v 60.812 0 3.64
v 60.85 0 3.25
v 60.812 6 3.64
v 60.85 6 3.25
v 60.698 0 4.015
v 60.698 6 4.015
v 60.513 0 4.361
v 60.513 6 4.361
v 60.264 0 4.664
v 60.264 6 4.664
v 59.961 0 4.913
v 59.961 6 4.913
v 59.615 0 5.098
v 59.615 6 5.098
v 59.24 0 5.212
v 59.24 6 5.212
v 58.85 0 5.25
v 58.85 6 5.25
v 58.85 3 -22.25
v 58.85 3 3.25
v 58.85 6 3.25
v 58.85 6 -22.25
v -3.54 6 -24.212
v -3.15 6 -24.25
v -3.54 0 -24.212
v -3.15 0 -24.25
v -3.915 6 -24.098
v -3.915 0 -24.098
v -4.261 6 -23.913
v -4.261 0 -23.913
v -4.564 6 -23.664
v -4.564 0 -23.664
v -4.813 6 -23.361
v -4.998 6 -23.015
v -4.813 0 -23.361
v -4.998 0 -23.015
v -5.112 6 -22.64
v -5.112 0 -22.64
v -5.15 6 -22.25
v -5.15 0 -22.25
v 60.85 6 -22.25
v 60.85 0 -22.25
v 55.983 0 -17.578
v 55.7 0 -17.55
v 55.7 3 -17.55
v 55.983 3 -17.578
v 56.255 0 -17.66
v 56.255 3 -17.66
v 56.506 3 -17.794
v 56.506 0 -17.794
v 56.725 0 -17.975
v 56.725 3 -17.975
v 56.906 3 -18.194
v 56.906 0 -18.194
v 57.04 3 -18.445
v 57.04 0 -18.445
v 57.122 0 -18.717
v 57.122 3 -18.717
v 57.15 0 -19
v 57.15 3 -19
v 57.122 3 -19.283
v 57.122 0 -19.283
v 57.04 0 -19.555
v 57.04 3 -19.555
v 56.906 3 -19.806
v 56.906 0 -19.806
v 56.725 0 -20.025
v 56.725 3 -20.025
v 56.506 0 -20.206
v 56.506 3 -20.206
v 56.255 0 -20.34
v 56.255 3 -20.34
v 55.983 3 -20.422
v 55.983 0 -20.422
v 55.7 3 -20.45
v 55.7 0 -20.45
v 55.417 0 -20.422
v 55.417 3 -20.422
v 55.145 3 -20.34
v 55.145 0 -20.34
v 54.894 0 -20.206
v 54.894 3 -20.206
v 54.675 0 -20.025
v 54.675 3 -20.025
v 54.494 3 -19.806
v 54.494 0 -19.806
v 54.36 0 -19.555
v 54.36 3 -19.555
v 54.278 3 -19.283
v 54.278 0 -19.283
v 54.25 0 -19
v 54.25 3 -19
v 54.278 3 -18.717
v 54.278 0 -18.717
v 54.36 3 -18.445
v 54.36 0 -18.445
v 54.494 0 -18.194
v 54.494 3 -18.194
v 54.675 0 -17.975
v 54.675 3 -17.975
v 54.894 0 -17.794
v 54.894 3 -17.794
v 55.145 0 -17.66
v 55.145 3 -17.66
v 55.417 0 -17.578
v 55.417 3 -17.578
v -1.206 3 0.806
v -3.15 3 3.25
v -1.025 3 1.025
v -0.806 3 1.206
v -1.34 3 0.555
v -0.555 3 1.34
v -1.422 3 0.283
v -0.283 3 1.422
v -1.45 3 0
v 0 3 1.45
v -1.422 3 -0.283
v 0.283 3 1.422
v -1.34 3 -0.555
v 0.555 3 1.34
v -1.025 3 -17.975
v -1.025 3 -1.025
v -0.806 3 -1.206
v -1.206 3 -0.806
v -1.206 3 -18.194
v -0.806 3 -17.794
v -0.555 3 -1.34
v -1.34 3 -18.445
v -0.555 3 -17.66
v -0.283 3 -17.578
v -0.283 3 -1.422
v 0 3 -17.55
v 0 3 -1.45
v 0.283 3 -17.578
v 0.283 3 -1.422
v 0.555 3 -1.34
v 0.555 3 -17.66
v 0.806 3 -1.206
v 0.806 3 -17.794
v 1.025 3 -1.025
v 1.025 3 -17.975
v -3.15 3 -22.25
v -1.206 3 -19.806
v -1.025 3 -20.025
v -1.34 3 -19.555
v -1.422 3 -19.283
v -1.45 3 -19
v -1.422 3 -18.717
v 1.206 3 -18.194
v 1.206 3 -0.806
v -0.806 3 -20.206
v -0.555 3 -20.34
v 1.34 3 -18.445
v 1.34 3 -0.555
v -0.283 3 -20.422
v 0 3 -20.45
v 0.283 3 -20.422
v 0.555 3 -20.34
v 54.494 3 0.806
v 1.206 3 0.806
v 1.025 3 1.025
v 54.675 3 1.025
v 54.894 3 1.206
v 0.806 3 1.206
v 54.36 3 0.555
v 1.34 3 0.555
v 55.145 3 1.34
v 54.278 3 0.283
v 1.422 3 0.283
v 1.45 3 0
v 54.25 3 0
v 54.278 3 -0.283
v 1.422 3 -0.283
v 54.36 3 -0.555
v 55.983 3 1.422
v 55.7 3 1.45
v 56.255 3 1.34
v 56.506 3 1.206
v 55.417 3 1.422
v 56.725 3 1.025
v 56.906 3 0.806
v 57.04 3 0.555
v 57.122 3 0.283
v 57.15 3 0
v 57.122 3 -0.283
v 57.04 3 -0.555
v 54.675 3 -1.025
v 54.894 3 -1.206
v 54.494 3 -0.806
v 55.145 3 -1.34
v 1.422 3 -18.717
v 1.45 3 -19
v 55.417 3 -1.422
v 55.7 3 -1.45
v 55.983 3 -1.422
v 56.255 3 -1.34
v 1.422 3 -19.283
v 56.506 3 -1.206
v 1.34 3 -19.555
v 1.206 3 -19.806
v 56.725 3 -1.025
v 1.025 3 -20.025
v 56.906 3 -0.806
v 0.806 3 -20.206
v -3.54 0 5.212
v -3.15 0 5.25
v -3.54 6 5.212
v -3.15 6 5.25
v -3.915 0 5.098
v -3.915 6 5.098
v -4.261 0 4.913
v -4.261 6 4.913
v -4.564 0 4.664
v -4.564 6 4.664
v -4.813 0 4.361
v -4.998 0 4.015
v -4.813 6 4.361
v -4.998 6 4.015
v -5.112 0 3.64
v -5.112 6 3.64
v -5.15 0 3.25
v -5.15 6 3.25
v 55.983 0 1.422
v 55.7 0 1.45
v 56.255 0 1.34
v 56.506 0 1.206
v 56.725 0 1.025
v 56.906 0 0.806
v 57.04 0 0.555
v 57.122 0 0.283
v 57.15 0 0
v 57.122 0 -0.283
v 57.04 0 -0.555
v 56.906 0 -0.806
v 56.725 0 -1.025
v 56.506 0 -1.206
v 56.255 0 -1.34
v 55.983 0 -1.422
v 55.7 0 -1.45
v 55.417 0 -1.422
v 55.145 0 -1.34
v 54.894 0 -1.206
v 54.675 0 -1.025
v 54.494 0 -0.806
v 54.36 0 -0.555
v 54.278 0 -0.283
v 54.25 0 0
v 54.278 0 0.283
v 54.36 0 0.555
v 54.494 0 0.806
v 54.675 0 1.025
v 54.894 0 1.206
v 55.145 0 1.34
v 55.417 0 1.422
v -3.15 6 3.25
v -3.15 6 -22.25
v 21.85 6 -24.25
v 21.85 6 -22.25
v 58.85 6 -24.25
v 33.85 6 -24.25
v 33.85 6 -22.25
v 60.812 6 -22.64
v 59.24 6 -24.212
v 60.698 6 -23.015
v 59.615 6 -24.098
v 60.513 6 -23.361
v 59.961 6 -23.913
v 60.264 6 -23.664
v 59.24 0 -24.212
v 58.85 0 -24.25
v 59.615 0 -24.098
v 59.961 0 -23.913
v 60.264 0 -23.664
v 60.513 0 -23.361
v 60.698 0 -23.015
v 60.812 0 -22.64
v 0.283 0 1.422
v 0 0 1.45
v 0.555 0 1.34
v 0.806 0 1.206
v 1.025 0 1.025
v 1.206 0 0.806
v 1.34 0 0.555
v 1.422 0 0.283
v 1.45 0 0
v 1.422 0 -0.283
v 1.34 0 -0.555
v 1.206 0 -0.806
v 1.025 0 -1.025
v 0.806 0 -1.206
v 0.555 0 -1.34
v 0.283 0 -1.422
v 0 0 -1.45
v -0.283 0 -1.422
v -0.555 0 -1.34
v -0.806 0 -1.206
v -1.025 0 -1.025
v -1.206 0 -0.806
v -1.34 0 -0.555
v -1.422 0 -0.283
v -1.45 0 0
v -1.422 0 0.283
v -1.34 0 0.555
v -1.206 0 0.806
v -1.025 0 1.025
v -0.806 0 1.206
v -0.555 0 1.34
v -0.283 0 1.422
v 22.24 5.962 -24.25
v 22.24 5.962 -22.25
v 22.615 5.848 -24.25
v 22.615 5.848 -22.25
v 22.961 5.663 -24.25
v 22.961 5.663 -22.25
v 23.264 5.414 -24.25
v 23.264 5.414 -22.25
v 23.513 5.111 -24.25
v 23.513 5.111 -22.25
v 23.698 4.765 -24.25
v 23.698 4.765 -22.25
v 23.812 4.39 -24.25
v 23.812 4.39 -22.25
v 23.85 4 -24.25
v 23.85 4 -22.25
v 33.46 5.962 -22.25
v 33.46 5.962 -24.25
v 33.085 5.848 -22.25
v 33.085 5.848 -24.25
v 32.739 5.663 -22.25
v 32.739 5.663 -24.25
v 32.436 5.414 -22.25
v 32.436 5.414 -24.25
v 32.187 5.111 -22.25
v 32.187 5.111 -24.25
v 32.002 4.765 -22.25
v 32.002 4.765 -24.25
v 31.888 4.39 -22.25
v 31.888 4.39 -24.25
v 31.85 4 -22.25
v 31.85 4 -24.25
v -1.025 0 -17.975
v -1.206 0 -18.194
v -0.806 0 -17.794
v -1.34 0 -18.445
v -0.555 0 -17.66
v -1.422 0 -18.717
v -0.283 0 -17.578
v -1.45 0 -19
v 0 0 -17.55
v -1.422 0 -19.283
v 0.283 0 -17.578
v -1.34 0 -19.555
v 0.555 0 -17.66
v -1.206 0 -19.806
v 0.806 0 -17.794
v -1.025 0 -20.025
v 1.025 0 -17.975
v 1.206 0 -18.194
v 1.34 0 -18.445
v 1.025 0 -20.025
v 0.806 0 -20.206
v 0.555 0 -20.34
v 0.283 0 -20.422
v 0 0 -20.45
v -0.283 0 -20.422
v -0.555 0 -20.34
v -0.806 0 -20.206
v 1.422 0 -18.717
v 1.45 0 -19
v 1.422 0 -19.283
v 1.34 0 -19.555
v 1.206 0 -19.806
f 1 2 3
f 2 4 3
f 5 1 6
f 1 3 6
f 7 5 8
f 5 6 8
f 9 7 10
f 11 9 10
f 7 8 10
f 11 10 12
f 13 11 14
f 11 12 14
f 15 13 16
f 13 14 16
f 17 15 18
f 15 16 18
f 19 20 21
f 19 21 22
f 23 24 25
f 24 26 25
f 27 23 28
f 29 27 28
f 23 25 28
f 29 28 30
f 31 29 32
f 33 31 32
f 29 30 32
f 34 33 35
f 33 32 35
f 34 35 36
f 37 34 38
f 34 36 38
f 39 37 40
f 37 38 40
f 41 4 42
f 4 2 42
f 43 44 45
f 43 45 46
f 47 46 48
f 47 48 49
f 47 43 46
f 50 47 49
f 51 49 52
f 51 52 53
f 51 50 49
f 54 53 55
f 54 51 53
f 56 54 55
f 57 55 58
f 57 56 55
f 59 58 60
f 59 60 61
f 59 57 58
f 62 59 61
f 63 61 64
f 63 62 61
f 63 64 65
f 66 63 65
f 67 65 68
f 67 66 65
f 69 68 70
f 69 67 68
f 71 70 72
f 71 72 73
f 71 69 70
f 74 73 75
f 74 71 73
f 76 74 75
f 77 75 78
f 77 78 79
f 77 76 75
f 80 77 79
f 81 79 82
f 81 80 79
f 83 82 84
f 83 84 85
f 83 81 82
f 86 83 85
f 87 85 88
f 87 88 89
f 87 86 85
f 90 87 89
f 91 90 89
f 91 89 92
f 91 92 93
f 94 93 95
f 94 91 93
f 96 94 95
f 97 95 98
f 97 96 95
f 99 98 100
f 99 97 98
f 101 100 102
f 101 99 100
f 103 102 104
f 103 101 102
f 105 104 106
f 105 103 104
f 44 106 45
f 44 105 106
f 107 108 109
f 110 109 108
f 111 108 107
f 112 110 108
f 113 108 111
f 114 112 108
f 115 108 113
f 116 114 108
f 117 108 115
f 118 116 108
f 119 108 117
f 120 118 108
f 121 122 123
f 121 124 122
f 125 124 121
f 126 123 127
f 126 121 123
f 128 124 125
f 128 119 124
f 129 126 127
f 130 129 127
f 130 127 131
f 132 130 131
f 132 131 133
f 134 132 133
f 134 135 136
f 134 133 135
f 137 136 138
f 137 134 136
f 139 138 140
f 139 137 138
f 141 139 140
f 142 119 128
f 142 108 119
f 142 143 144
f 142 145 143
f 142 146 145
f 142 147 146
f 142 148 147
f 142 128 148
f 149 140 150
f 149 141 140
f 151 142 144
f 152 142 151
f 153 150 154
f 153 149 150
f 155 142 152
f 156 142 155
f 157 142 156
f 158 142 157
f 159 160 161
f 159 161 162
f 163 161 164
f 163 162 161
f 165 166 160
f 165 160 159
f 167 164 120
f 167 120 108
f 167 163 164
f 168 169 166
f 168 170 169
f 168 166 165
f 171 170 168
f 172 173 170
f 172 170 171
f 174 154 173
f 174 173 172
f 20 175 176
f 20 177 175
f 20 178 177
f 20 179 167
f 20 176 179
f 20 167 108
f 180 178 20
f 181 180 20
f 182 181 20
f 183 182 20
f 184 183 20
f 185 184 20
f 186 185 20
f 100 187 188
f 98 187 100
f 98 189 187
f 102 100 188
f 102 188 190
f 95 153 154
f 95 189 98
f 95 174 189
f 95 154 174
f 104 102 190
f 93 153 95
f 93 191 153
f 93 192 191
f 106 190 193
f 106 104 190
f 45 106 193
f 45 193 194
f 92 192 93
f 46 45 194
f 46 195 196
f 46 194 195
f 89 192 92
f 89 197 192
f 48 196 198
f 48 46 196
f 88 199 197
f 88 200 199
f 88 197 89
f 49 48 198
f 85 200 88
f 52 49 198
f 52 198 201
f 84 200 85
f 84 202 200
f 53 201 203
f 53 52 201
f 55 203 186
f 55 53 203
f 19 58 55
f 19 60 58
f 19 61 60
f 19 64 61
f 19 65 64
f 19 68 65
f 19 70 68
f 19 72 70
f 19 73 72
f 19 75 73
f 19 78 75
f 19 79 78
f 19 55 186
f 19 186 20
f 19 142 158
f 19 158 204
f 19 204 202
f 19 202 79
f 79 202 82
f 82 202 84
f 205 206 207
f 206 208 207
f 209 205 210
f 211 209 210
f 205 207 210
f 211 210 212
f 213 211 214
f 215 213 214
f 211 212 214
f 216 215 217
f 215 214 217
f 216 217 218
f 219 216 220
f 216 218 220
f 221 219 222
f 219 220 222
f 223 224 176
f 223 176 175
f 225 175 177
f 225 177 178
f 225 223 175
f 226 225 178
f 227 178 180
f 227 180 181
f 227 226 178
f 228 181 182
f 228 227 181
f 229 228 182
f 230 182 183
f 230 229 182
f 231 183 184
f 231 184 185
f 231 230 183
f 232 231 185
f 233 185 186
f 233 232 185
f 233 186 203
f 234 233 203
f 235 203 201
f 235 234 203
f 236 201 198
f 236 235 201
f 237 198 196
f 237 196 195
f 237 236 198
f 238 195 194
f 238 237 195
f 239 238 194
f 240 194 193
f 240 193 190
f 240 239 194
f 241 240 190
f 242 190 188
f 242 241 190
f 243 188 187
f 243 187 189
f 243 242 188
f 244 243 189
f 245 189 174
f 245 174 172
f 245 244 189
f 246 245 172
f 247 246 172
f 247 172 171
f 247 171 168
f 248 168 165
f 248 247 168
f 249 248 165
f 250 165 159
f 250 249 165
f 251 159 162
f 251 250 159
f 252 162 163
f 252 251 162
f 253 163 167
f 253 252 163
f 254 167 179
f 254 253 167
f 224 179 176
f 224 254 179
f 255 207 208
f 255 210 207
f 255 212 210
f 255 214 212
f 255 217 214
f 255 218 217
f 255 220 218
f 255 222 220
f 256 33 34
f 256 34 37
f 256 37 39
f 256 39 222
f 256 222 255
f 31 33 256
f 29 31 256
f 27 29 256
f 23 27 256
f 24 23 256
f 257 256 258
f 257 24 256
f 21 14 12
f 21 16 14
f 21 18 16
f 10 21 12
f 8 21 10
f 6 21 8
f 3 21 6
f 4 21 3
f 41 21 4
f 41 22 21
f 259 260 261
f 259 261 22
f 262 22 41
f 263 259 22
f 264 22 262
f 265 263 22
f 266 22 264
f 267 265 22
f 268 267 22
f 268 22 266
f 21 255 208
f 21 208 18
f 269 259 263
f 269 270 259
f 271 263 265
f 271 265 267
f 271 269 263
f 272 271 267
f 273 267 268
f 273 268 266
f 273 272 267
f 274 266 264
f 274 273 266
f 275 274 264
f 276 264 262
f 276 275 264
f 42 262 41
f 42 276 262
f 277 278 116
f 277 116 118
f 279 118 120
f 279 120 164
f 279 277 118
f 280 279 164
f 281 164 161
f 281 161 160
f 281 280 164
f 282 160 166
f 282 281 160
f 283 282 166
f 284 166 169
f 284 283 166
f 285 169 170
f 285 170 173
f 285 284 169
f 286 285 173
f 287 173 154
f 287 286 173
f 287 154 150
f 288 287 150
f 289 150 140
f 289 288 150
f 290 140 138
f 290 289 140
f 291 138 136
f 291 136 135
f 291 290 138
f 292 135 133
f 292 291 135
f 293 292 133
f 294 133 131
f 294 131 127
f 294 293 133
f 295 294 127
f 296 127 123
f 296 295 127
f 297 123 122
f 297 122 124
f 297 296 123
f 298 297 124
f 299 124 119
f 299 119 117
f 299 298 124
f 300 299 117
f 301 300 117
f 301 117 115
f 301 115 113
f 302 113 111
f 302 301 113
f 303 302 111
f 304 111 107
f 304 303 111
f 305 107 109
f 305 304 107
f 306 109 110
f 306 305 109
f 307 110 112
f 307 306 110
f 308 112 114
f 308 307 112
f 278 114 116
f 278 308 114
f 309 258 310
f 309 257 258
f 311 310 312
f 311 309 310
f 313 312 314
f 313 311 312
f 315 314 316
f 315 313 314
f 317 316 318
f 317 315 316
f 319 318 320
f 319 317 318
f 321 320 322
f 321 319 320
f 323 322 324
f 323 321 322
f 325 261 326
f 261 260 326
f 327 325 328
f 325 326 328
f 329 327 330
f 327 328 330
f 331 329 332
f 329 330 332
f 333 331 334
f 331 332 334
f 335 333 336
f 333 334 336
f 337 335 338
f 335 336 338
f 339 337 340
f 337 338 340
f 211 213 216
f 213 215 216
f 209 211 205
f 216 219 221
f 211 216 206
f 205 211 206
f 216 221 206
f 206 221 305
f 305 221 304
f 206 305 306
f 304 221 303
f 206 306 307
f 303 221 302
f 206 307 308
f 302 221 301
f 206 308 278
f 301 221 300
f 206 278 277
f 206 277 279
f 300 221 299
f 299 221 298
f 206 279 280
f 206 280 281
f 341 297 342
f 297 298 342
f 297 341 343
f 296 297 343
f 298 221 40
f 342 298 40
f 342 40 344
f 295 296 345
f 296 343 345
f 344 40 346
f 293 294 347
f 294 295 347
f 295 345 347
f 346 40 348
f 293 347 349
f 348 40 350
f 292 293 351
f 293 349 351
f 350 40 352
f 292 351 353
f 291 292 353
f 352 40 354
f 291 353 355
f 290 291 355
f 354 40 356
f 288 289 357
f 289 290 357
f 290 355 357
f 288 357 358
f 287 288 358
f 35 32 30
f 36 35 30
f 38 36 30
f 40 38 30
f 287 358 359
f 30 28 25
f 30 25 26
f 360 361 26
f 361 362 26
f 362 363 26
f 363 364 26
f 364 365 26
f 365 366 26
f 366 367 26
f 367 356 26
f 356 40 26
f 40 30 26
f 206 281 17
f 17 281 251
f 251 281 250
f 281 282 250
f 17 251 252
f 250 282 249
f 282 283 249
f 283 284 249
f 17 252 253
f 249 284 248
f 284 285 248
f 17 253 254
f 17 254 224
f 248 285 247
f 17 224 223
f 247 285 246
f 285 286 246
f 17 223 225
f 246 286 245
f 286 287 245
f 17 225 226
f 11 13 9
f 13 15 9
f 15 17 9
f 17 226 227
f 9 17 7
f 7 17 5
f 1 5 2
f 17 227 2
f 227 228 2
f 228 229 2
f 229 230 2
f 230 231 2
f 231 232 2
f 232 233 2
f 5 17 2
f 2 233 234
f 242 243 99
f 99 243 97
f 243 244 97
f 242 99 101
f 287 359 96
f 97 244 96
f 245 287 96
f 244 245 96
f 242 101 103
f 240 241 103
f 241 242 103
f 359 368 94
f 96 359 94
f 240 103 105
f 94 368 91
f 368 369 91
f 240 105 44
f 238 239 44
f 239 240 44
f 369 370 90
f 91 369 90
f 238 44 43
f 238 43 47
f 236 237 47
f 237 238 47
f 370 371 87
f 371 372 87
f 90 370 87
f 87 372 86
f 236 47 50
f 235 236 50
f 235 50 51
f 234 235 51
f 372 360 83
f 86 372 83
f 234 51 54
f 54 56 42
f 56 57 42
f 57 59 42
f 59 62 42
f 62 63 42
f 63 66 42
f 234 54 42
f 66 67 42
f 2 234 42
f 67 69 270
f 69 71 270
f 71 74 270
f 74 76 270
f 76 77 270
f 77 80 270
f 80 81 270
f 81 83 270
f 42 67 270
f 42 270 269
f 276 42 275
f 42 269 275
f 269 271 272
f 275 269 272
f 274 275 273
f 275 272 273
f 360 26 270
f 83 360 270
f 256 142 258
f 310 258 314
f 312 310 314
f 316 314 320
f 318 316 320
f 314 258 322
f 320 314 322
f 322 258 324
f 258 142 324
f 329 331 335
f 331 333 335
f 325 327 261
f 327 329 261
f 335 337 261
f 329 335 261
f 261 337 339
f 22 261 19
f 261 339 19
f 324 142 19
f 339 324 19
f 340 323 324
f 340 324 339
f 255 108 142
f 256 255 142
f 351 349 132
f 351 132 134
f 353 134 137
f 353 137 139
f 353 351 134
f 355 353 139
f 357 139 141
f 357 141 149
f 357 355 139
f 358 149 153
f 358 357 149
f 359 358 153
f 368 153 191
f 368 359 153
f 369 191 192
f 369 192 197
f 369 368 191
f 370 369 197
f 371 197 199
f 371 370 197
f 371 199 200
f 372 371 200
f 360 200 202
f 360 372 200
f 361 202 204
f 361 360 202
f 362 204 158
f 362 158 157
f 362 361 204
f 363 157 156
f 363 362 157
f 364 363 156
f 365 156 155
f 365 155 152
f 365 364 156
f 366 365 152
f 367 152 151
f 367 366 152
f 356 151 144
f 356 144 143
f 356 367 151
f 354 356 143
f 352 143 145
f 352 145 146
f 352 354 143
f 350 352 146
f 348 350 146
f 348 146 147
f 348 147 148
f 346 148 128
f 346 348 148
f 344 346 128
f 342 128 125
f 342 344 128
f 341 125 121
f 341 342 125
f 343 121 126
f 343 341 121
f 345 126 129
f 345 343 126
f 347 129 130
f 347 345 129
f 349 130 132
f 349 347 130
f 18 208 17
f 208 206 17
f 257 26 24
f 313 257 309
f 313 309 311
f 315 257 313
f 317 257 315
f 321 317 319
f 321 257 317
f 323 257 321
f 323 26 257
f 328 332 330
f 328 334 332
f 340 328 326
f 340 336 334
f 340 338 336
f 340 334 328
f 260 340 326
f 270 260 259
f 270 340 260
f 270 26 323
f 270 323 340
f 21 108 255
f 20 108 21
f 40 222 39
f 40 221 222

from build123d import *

# Parameters (mm, degrees)
SKETCH1_W           = 66
SKETCH1_H           = 29.5
SKETCH1_W_2         = 62
SKETCH1_H_2         = 25.5
SKETCH1_R           = 1.45
BOSS_EXTRUDE1_DEPTH = 3
SKETCH1_3_W         = 66
SKETCH1_3_H         = 29.5
SKETCH1_3_W_2       = 62
SKETCH1_3_H_2       = 25.5
BOSS_EXTRUDE3_DEPTH = 6
FILLET1_R           = 2
SKETCH2_W           = 8
SKETCH2_H           = 2
CUT_EXTRUDE1_DEPTH  = 2
FILLET2_R           = 2


with BuildPart() as part:
    # Sketch1 → Boss-Extrude1 (new body)
    # profile 1 of 2: a face of its own
    with BuildSketch(Plane(origin=(0, 0, 0), x_dir=(1, 0, 0), z_dir=(0, 1, 0))):
        with Locations((27.85, 9.5)):
            Rectangle(SKETCH1_W, SKETCH1_H)
        with Locations((27.85, 9.5)):
            Rectangle(SKETCH1_W_2, SKETCH1_H_2, mode=Mode.SUBTRACT)
    # profile 2 of 2: a face of its own
    with BuildSketch(Plane(origin=(0, 0, 0), x_dir=(1, 0, 0), z_dir=(0, 1, 0))):
        with Locations((27.85, 9.5)):
            Rectangle(SKETCH1_W_2, SKETCH1_H_2)
        with Locations(Location((55.7, 19, 0), (0, 0, 270))):
            Circle(SKETCH1_R, mode=Mode.SUBTRACT)
        with Locations(Location((0, 19, 0), (0, 0, 270))):
            Circle(SKETCH1_R, mode=Mode.SUBTRACT)
        with Locations(Location((55.7, 0, 0), (0, 0, 270))):
            Circle(SKETCH1_R, mode=Mode.SUBTRACT)
        with Locations(Location((0, 0, 0), (0, 0, 270))):
            Circle(SKETCH1_R, mode=Mode.SUBTRACT)
    extrude(amount=BOSS_EXTRUDE1_DEPTH)

    # Sketch1<3> → Boss-Extrude3 (add)
    with BuildSketch(Plane(origin=(0, 0, 0), x_dir=(1, 0, 0), z_dir=(0, 1, 0))):
        with Locations((27.85, 9.5)):
            Rectangle(SKETCH1_3_W, SKETCH1_3_H)
        with Locations((27.85, 9.5)):
            Rectangle(SKETCH1_3_W_2, SKETCH1_3_H_2, mode=Mode.SUBTRACT)
    extrude(amount=BOSS_EXTRUDE3_DEPTH)

    # Fillet1
    fillet1_edges = [part.edges().sort_by_distance(p)[0] for p in [
        (-5.15, 3, -24.25),
        (60.85, 3, -24.25),
        (60.85, 3, 5.25),
        (-5.15, 3, 5.25),
    ]]
    fillet(fillet1_edges, radius=FILLET1_R)

    # Sketch2 → Cut-Extrude1 (cut)
    with BuildSketch(Plane(origin=(0, 6, 0), x_dir=(1, 0, 0), z_dir=(0, 1, 0))):
        with Locations((27.85, 23.25)):
            Rectangle(SKETCH2_W, SKETCH2_H)
    extrude(amount=-CUT_EXTRUDE1_DEPTH, mode=Mode.SUBTRACT)

    # Fillet2
    fillet2_edges = [part.edges().sort_by_distance(p)[0] for p in [
        (31.85, 6, -23.25),
        (23.85, 6, -23.25),
    ]]
    fillet(fillet2_edges, radius=FILLET2_R - 0.0001)  # a hair under: the kernel refuses the full size


solid = part.part
